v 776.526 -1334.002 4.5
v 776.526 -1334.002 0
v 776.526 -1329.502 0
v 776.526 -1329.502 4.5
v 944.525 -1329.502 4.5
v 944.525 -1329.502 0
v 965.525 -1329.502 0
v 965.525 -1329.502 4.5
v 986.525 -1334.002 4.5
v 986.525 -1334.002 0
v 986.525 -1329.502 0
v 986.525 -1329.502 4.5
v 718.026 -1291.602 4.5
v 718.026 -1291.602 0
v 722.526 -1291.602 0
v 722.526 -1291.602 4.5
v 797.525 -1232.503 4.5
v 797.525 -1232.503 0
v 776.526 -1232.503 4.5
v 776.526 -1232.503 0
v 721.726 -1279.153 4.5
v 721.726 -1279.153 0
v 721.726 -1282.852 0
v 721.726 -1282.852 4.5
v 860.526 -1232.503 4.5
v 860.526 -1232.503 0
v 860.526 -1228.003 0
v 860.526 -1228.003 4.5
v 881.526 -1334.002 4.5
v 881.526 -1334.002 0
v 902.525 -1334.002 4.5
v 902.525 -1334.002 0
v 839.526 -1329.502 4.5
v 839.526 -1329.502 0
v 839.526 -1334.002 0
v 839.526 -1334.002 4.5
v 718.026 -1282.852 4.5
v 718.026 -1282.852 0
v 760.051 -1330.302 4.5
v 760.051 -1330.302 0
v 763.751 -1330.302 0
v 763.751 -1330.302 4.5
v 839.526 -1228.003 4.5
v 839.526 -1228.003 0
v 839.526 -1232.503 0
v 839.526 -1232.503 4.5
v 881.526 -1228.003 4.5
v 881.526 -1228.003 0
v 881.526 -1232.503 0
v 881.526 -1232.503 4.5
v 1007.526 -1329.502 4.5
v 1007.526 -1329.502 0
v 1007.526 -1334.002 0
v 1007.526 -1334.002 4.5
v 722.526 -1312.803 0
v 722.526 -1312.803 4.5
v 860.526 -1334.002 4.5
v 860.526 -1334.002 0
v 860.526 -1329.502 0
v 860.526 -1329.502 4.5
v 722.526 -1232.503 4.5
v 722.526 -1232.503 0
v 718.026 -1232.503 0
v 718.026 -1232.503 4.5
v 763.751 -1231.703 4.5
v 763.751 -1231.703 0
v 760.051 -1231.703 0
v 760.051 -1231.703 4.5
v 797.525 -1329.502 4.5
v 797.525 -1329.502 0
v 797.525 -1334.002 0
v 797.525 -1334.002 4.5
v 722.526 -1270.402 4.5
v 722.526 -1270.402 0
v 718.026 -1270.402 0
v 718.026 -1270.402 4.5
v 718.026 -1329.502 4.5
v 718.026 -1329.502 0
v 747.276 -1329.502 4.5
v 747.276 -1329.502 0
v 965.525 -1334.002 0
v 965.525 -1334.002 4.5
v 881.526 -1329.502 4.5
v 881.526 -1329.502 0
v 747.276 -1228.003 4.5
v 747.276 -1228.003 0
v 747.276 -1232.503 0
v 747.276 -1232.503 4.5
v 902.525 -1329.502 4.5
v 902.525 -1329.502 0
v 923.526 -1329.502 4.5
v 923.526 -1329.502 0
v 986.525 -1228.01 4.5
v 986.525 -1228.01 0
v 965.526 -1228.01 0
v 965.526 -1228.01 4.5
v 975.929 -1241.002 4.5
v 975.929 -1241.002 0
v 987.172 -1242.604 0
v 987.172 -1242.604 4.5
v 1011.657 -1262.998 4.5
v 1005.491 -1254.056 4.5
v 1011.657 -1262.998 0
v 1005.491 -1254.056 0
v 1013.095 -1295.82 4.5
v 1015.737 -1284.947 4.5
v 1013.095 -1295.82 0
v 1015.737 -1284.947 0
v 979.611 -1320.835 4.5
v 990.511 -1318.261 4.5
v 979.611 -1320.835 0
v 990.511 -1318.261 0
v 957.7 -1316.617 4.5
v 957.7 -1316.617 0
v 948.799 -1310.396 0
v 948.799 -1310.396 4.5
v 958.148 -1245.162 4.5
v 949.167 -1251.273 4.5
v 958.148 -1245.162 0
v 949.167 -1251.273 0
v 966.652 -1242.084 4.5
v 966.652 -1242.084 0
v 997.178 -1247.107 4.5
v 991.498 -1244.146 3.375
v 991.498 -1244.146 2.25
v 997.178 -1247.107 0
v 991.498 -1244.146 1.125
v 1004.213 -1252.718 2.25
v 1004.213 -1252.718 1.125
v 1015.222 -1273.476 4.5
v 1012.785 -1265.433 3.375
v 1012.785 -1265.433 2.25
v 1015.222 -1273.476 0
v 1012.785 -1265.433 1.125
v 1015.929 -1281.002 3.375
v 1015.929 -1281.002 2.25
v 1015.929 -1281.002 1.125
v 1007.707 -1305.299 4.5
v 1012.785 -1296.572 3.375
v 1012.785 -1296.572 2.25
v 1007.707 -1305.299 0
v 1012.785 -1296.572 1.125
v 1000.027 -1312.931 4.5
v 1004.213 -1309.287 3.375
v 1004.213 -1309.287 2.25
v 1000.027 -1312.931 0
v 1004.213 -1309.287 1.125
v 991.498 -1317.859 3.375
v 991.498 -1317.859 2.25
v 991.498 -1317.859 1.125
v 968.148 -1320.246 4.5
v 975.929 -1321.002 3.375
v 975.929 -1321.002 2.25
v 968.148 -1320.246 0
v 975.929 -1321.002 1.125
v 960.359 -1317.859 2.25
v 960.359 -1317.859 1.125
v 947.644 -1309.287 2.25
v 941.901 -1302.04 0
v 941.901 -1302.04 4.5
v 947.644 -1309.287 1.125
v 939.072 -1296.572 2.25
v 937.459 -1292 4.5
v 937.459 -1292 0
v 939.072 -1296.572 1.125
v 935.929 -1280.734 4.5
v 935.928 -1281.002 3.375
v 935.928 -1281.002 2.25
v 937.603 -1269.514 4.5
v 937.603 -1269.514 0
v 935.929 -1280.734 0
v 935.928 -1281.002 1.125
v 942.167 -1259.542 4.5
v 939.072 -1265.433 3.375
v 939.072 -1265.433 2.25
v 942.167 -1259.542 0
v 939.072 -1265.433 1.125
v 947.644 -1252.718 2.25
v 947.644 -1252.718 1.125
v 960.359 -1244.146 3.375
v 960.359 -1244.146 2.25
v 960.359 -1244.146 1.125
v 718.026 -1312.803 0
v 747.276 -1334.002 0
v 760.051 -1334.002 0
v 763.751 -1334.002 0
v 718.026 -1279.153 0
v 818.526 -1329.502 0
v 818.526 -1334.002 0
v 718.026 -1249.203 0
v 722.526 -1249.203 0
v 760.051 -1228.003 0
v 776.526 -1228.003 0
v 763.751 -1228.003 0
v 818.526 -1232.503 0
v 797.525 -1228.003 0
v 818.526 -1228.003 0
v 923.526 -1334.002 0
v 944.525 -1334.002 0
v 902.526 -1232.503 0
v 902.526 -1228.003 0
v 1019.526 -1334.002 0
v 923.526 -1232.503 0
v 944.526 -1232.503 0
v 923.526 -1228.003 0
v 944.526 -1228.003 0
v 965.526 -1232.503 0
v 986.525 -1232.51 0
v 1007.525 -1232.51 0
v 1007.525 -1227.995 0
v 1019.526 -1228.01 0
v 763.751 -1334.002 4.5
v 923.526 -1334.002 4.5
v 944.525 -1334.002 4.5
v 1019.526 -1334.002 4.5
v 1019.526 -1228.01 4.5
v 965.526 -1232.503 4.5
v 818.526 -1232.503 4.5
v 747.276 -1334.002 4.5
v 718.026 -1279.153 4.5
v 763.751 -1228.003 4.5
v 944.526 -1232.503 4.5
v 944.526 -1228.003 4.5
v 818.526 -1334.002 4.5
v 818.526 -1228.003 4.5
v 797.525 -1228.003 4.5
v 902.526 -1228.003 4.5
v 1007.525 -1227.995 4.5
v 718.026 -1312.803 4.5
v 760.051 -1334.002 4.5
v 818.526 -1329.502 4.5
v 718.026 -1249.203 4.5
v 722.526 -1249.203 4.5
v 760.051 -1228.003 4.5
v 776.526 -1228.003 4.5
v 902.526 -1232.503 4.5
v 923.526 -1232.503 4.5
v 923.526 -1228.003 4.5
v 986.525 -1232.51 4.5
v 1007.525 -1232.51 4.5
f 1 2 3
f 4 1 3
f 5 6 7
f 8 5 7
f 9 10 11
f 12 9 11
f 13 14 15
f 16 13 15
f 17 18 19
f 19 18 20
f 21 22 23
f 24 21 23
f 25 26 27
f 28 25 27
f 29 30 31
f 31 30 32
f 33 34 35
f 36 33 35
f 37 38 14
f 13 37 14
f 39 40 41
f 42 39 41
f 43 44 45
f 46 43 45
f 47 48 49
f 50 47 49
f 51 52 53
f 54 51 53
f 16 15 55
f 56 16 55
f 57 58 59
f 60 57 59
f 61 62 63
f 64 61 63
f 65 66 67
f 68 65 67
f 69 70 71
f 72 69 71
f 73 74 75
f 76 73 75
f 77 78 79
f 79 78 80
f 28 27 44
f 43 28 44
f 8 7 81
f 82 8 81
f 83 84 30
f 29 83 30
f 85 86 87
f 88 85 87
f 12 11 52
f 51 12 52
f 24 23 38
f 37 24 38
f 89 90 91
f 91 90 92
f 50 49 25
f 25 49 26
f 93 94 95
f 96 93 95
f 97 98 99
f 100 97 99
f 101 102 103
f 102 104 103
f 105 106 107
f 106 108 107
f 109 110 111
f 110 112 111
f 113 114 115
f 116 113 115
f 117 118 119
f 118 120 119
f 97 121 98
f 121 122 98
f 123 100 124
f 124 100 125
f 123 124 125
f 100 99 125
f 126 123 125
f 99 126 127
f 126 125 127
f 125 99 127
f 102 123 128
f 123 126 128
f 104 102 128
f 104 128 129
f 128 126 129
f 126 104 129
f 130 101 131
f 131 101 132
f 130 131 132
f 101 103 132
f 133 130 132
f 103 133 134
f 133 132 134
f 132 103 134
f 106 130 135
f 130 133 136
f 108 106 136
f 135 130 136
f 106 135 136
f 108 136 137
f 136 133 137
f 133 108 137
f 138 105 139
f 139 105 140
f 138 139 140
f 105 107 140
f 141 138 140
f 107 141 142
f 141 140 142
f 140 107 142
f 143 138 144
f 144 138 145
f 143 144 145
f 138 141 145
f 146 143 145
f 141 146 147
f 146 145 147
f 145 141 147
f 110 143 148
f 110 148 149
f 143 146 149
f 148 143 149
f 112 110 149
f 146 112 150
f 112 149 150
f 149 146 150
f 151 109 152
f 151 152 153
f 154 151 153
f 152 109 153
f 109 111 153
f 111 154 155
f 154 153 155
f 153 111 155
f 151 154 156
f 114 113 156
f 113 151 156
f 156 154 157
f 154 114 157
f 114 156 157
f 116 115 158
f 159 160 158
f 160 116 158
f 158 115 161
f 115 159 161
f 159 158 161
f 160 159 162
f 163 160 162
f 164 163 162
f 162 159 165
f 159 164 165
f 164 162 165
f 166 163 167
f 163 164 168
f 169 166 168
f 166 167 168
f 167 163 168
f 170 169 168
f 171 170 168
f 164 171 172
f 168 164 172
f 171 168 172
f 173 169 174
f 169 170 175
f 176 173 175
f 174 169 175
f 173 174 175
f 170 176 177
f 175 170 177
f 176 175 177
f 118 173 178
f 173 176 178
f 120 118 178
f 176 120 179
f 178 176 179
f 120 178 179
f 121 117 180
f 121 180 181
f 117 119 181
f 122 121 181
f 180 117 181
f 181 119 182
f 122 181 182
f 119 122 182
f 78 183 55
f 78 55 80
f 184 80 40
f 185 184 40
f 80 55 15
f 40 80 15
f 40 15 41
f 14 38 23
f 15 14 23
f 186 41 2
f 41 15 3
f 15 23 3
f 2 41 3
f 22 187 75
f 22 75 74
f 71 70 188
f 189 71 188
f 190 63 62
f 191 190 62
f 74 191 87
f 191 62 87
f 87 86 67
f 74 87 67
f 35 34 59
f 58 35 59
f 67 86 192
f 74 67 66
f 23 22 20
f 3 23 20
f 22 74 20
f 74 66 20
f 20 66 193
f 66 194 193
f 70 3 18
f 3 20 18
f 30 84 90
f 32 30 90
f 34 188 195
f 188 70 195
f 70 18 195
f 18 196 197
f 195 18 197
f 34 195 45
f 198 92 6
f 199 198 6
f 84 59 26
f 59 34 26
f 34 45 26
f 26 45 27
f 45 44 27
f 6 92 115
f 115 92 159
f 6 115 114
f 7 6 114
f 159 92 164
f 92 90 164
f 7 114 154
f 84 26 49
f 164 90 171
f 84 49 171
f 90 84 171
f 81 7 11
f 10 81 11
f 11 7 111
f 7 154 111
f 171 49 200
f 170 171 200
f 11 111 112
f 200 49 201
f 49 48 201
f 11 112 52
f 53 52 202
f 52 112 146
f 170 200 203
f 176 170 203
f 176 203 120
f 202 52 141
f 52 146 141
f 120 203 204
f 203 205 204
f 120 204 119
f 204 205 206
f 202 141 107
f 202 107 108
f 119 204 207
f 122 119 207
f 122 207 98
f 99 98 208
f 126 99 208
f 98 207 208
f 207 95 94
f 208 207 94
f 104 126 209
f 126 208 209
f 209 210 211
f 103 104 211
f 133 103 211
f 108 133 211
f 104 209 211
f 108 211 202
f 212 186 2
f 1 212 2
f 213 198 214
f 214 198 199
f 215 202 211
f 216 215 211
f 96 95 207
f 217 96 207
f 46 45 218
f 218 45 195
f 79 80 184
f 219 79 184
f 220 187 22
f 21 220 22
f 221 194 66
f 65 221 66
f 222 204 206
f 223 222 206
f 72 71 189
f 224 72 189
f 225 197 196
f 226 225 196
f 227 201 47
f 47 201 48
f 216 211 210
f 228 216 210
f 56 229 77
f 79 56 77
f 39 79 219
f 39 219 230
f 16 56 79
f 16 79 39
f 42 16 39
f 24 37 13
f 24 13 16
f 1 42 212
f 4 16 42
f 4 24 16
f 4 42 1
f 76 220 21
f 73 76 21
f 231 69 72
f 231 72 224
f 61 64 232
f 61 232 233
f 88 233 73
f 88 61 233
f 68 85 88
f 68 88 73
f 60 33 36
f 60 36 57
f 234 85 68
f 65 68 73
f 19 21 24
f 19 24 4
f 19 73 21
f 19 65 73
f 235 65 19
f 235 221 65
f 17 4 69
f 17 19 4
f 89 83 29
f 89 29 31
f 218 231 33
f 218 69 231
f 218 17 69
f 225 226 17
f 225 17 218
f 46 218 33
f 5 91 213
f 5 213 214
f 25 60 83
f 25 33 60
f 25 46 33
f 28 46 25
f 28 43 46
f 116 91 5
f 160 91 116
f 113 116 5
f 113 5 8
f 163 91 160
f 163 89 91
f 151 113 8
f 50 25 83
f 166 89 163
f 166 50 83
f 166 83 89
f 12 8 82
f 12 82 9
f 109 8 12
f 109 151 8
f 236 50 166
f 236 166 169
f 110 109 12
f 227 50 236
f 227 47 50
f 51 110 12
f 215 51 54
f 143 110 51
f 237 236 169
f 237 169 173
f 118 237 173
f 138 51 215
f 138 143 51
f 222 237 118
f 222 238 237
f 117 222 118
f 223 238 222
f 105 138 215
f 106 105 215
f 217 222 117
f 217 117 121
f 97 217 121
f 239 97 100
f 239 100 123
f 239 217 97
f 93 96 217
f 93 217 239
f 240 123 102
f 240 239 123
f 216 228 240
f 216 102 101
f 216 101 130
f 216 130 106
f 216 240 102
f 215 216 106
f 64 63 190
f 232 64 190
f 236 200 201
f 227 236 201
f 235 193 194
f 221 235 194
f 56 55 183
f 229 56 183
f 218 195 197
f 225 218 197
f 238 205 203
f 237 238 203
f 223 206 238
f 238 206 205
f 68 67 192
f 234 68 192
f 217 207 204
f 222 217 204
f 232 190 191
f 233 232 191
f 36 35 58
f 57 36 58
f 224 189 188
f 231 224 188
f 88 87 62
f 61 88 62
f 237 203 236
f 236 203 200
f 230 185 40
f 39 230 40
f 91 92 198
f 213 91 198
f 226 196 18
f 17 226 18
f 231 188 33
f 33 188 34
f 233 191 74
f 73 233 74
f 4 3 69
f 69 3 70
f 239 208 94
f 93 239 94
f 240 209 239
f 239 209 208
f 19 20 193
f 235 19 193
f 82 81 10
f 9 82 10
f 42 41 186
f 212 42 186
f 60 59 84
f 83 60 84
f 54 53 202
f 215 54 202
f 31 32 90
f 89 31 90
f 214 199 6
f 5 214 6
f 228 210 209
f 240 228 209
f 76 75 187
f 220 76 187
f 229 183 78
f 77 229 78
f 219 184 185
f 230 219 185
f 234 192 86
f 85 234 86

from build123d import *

# Parameters (mm, degrees)
BOSS_EXTRUDE1_DEPTH = 4.5


with BuildPart() as part:
    # Model → Boss-Extrude1 (new body)
    with BuildSketch(Plane.XY):
        Polygon((760.050761477, -1228.002546082), (747.275655091, -1228.002546082), (747.275655091, -1232.502544136), (722.525753986, -1232.502544136), (718.025755932, -1232.502508859), (718.025755932, -1249.202620799), (722.525753986, -1249.202620799), (722.525753986, -1270.402342738), (718.025755932, -1270.402342738), (718.025755932, -1279.15257218), (721.725795097, -1279.15257218), (721.725795097, -1282.852258568), (718.025755932, -1282.852258568), (718.025755932, -1291.602452733), (722.525753986, -1291.602452733), (722.525753986, -1312.80252745), (718.025755932, -1312.80252745), (718.025755932, -1329.502286612), (747.275655091, -1329.502286612), (747.275655091, -1334.002249389), (760.050761477, -1334.002249389), (760.050761477, -1330.302245501), (763.750800642, -1330.302245501), (763.750800642, -1334.002249389), (776.52555425, -1334.002249389), (776.52555425, -1329.502286612), (797.525462856, -1329.502286612), (797.525462856, -1334.002249389), (818.525759518, -1334.002249389), (818.525759518, -1329.502286612), (839.525668123, -1329.502286612), (839.525668123, -1334.002249389), (860.525612007, -1334.002249389), (860.525612007, -1329.502286612), (881.525520613, -1329.502286612), (881.525520613, -1334.002249389), (902.525429219, -1334.002249389), (902.525429219, -1329.502286612), (923.525514214, -1329.502286612), (923.525514214, -1334.002249389), (944.525422819, -1334.002249389), (944.525422819, -1329.502286612), (965.525401981, -1329.502286612), (965.525401981, -1334.002249389), (986.525310587, -1334.002249389), (986.525310587, -1329.502286612), (1007.525607248, -1329.502286612), (1007.52557197, -1334.002249389), (1019.525696134, -1334.002249389), (1019.525696134, -1228.010060249), (1007.525430859, -1227.995031915), (1007.525430859, -1232.510058303), (986.525486976, -1232.510058303), (986.525486976, -1228.010060249), (965.52557837, -1228.010060249), (965.52557837, -1232.502544136), (944.525634486, -1232.502544136), (944.525634486, -1228.002546082), (923.52572588, -1228.002546082), (923.52572588, -1232.502544136), (902.525781997, -1232.502544136), (902.525781997, -1228.002546082), (881.525873391, -1228.002546082), (881.525873391, -1232.502544136), (860.525612007, -1232.502544136), (860.525612007, -1228.002546082), (839.525668123, -1228.002546082), (839.525668123, -1232.502544136), (818.525759518, -1232.502544136), (818.525759518, -1228.002546082), (797.525462856, -1228.002546082), (797.525462856, -1232.502544136), (776.52555425, -1232.502544136), (776.52555425, -1228.002546082), (763.750800642, -1228.002546082), (763.750800642, -1231.70254997), (760.050761477, -1231.70254997), align=None)
        with BuildLine():
            add(Edge.make_bspline(
                [(975.928536423, -1321.002388281), (953.837062817, -1321.002388281), (935.928404766, -1303.093765508), (935.928404766, -1281.002433013), (935.928404766, -1258.911100519), (953.837062817, -1241.002442468), (975.928536423, -1241.002442468)],
                knots=[2, 2, 2, 2, 3, 3, 3, 4, 4, 4, 4], degree=3))
            add(Edge.make_bspline(
                [(975.928536423, -1241.002442468), (998.020045306, -1241.002442468), (1015.928703357, -1258.911100519), (1015.928703357, -1281.002433013), (1015.928703357, -1303.093765508), (998.020045306, -1321.002388281), (975.928536423, -1321.002388281)],
                knots=[0, 0, 0, 0, 1, 1, 1, 2, 2, 2, 2], degree=3))
        make_face(mode=Mode.SUBTRACT)
    extrude(amount=BOSS_EXTRUDE1_DEPTH)


solid = part.part
